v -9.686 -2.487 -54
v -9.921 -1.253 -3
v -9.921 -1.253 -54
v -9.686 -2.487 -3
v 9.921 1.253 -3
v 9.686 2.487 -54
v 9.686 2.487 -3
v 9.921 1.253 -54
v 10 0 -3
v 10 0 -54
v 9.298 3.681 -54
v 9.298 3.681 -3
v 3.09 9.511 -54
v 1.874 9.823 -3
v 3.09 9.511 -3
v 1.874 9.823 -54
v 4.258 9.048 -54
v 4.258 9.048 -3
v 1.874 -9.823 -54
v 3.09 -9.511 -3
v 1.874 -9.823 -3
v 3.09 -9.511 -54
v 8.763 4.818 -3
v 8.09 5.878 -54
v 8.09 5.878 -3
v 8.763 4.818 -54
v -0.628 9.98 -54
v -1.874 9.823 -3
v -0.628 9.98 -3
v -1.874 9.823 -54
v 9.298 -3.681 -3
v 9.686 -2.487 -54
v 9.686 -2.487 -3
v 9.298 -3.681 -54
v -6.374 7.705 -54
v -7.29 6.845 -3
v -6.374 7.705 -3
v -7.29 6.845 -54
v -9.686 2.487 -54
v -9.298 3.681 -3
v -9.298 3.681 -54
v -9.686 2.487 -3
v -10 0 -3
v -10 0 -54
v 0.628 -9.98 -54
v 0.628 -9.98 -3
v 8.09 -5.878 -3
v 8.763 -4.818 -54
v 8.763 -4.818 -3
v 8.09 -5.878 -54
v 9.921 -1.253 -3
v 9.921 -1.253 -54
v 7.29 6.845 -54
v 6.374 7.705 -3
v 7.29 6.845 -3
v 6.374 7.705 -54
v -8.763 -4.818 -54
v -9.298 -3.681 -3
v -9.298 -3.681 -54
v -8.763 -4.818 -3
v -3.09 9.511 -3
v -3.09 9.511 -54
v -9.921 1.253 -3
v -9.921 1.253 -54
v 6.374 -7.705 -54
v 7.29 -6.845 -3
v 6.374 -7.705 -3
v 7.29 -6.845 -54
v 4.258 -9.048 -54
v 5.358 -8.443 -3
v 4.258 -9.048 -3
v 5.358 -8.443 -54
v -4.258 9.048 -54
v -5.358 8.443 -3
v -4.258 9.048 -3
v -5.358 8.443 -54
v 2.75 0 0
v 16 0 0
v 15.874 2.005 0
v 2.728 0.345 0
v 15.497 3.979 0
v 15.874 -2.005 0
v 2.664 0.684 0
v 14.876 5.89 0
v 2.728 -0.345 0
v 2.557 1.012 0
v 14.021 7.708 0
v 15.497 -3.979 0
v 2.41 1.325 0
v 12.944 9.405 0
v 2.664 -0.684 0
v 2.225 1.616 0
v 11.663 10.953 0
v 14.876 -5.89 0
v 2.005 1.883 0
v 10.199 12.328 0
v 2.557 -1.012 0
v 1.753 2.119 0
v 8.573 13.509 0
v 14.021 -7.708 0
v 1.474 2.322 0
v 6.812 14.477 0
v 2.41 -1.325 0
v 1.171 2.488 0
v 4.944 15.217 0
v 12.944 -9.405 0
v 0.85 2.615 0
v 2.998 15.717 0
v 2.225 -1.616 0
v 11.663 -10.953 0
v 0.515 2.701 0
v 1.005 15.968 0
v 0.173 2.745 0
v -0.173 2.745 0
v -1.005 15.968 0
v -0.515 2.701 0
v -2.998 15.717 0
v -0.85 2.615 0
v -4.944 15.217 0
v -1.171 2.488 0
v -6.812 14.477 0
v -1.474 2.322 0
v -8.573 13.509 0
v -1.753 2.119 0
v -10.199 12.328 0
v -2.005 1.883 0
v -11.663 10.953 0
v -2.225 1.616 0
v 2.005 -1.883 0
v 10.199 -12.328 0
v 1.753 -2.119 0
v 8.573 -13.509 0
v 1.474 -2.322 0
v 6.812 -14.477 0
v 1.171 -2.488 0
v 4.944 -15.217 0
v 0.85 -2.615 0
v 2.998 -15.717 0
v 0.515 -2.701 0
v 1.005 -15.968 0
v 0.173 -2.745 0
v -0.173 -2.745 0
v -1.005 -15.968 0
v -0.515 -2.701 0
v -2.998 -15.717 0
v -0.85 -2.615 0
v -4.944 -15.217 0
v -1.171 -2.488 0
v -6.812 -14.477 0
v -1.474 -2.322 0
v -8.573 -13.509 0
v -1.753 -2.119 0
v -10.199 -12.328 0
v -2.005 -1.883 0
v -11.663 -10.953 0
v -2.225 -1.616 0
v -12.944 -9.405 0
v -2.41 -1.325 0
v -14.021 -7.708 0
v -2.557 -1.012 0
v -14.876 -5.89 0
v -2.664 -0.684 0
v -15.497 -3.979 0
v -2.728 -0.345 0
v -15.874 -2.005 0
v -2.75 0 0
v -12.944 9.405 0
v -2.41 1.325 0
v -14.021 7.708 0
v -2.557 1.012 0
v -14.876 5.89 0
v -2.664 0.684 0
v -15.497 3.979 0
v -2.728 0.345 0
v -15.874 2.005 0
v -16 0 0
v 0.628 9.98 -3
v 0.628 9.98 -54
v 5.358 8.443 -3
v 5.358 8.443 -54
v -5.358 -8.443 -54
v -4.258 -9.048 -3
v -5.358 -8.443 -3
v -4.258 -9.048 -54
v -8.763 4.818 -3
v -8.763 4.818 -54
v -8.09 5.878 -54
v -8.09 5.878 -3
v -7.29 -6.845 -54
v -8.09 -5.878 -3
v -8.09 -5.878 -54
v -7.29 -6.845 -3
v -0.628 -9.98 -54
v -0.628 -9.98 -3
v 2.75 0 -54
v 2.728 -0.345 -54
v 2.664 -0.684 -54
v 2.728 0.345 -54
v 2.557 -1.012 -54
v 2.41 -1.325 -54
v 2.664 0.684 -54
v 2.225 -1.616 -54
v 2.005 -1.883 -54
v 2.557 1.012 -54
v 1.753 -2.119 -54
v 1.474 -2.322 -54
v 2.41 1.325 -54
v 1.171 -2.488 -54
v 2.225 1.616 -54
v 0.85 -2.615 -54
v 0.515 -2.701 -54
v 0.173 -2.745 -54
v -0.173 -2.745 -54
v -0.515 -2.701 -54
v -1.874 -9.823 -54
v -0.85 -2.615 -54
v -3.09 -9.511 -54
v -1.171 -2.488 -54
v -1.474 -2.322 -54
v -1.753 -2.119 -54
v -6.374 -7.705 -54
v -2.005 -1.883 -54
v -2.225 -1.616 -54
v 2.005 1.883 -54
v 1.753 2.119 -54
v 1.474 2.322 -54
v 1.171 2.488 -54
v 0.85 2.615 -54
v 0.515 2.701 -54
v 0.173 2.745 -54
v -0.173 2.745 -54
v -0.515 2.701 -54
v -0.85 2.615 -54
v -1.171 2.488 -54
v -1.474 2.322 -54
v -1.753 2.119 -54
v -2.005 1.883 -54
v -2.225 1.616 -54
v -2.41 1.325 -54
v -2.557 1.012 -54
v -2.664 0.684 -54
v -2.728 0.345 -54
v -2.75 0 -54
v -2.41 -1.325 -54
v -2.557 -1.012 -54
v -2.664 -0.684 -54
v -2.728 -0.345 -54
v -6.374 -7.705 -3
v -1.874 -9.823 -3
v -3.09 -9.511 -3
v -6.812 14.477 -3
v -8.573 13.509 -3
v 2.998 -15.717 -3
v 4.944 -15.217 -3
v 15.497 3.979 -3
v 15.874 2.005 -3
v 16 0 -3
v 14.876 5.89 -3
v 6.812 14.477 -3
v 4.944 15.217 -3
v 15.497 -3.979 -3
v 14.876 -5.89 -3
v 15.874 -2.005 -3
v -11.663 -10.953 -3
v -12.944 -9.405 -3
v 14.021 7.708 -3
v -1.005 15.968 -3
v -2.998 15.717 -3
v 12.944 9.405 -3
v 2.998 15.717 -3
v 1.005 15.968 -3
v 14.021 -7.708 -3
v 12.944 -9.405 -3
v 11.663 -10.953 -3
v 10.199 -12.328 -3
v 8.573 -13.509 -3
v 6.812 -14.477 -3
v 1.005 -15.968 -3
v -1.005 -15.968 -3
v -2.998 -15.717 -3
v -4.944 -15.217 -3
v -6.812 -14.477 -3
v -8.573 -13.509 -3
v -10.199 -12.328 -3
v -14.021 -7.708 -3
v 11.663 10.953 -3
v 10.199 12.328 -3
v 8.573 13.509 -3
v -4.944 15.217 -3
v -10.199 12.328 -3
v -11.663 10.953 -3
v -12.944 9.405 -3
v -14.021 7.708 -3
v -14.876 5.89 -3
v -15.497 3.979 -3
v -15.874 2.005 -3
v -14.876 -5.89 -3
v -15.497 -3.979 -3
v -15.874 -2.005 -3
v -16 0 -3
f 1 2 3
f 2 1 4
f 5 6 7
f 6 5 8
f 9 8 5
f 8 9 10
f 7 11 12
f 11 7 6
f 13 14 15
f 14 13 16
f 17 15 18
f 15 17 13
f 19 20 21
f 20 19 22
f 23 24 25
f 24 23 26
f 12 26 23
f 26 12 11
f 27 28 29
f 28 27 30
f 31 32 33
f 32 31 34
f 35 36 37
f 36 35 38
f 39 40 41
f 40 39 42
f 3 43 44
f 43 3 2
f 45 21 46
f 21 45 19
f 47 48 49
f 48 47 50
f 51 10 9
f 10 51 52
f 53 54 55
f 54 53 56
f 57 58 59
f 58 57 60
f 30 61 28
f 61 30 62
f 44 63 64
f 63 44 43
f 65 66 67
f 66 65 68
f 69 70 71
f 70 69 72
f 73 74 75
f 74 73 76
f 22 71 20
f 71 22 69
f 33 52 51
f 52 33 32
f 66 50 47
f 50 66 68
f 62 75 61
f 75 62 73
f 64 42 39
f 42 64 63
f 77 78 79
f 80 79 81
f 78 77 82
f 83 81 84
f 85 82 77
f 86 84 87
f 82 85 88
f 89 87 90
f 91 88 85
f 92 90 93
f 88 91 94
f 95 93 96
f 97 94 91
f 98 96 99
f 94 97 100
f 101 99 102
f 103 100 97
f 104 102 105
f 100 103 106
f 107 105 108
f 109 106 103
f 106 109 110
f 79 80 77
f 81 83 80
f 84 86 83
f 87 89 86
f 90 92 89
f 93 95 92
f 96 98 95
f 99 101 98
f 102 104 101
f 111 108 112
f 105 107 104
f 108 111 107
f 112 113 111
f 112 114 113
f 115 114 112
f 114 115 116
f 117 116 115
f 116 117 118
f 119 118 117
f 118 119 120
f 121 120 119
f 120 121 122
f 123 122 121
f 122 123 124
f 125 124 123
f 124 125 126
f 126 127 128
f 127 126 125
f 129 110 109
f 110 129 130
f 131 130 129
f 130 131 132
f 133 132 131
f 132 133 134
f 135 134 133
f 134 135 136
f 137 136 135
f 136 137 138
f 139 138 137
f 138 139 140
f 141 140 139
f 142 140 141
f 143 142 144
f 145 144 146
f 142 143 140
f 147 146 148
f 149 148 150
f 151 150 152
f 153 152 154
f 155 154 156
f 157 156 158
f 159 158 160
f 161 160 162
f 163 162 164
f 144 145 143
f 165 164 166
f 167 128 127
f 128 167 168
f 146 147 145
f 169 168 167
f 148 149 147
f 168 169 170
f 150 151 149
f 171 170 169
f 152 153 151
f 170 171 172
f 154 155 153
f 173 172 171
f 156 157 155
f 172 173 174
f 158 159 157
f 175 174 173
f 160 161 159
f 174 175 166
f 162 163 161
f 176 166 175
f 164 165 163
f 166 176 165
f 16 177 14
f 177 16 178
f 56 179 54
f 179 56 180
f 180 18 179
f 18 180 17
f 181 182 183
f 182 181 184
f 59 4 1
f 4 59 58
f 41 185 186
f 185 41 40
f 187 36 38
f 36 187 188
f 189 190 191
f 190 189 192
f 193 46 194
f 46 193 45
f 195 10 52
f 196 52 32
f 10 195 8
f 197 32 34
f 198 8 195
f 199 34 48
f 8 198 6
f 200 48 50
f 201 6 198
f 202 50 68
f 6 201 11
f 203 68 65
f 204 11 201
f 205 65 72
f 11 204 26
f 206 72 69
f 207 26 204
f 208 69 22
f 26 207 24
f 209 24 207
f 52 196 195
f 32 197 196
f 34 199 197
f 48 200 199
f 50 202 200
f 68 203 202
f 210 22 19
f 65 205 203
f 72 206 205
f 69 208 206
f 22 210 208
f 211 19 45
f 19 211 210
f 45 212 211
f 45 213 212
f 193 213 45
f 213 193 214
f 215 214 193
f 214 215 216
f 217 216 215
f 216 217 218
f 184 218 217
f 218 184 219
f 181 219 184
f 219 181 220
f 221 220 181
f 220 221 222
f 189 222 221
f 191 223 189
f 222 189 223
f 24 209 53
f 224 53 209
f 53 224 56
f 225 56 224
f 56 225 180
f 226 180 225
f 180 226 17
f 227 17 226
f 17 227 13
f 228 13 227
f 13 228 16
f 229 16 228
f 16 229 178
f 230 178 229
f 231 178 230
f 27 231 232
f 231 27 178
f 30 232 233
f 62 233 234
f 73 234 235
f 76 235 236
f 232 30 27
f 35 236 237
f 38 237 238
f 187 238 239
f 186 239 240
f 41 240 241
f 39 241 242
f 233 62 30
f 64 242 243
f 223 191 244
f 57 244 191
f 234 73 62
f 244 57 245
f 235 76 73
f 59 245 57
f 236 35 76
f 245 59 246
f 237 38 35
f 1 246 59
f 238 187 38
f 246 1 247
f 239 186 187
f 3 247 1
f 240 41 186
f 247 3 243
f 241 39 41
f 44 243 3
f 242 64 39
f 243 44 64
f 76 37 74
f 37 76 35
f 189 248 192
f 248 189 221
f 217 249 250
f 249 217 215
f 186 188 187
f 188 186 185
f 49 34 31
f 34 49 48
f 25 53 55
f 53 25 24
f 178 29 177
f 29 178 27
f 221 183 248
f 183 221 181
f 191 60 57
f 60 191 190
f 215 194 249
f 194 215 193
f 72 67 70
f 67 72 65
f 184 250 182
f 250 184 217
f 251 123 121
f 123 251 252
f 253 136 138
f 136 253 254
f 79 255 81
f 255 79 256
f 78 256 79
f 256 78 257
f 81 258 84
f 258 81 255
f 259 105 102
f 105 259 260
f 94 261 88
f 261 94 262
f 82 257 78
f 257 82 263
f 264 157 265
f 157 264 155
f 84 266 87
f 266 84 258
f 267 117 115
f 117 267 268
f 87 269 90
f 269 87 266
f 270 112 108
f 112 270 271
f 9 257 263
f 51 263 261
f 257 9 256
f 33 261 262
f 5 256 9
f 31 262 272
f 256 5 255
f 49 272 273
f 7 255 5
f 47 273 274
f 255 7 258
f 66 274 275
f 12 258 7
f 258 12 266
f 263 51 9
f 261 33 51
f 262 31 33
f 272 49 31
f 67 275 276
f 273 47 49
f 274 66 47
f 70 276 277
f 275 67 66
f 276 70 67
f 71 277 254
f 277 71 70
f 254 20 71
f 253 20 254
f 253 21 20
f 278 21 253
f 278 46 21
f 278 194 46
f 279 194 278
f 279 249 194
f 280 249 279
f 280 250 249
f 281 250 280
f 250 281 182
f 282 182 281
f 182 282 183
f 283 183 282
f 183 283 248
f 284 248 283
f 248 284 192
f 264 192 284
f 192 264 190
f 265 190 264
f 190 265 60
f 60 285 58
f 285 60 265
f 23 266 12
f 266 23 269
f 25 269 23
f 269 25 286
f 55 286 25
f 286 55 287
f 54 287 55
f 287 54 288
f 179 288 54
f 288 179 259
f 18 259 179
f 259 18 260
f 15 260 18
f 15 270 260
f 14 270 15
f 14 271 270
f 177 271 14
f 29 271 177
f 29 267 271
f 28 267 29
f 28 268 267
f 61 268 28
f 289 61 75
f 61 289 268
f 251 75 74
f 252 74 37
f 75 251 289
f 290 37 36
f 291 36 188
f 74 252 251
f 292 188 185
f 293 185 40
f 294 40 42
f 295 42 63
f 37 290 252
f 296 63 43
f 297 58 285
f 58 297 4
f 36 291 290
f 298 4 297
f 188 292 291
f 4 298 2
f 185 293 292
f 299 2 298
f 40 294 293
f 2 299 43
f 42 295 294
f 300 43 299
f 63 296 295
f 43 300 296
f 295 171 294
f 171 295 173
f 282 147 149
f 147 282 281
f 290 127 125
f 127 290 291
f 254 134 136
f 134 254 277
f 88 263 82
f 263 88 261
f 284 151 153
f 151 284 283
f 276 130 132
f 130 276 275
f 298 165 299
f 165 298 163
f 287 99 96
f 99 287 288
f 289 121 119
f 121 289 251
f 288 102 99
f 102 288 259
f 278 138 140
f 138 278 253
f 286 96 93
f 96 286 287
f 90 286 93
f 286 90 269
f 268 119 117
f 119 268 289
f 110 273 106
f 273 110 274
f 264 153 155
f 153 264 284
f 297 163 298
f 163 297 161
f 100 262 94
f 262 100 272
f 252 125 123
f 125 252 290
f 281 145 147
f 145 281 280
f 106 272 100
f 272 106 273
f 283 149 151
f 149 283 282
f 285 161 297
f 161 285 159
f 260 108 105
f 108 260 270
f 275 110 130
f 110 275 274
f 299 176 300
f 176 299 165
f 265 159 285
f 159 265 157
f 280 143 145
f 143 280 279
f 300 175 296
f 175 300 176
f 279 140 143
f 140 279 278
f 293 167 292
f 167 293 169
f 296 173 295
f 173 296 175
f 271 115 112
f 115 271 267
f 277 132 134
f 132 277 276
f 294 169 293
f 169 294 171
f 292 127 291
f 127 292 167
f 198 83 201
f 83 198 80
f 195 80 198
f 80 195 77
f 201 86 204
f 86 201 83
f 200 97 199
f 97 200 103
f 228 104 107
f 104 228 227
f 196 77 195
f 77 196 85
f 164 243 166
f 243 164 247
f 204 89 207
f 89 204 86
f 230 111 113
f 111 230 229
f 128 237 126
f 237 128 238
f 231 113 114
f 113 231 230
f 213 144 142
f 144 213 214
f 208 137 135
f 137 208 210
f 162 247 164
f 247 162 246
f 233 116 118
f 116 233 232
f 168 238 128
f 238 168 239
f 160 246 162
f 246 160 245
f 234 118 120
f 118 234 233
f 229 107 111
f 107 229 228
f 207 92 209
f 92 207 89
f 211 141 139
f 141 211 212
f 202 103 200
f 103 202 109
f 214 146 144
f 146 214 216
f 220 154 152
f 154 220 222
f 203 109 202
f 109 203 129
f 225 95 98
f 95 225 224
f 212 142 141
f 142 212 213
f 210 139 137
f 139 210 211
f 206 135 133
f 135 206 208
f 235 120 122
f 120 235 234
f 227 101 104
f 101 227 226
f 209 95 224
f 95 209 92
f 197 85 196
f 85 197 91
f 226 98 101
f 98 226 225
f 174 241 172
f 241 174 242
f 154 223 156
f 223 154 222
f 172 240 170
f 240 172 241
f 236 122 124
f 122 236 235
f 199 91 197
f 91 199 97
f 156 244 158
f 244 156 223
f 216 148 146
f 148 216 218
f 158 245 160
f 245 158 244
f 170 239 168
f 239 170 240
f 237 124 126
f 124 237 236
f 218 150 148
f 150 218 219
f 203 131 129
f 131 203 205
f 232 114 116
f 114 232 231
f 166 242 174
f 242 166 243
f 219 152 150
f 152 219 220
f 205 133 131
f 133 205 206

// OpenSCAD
$fn = 50;


difference() {
	union() {
		translate(v = [0, 0, -54.0000000000]) {
			cylinder(h = 54, r = 10.0000000000);
		}
		translate(v = [0, 0, -3.0000000000]) {
			cylinder(h = 3, r = 16.0000000000);
		}
	}
	union() {
		#translate(v = [0, 0, -54]) {
			cylinder(h = 54, r = 2.7500000000);
		}
	}
}
